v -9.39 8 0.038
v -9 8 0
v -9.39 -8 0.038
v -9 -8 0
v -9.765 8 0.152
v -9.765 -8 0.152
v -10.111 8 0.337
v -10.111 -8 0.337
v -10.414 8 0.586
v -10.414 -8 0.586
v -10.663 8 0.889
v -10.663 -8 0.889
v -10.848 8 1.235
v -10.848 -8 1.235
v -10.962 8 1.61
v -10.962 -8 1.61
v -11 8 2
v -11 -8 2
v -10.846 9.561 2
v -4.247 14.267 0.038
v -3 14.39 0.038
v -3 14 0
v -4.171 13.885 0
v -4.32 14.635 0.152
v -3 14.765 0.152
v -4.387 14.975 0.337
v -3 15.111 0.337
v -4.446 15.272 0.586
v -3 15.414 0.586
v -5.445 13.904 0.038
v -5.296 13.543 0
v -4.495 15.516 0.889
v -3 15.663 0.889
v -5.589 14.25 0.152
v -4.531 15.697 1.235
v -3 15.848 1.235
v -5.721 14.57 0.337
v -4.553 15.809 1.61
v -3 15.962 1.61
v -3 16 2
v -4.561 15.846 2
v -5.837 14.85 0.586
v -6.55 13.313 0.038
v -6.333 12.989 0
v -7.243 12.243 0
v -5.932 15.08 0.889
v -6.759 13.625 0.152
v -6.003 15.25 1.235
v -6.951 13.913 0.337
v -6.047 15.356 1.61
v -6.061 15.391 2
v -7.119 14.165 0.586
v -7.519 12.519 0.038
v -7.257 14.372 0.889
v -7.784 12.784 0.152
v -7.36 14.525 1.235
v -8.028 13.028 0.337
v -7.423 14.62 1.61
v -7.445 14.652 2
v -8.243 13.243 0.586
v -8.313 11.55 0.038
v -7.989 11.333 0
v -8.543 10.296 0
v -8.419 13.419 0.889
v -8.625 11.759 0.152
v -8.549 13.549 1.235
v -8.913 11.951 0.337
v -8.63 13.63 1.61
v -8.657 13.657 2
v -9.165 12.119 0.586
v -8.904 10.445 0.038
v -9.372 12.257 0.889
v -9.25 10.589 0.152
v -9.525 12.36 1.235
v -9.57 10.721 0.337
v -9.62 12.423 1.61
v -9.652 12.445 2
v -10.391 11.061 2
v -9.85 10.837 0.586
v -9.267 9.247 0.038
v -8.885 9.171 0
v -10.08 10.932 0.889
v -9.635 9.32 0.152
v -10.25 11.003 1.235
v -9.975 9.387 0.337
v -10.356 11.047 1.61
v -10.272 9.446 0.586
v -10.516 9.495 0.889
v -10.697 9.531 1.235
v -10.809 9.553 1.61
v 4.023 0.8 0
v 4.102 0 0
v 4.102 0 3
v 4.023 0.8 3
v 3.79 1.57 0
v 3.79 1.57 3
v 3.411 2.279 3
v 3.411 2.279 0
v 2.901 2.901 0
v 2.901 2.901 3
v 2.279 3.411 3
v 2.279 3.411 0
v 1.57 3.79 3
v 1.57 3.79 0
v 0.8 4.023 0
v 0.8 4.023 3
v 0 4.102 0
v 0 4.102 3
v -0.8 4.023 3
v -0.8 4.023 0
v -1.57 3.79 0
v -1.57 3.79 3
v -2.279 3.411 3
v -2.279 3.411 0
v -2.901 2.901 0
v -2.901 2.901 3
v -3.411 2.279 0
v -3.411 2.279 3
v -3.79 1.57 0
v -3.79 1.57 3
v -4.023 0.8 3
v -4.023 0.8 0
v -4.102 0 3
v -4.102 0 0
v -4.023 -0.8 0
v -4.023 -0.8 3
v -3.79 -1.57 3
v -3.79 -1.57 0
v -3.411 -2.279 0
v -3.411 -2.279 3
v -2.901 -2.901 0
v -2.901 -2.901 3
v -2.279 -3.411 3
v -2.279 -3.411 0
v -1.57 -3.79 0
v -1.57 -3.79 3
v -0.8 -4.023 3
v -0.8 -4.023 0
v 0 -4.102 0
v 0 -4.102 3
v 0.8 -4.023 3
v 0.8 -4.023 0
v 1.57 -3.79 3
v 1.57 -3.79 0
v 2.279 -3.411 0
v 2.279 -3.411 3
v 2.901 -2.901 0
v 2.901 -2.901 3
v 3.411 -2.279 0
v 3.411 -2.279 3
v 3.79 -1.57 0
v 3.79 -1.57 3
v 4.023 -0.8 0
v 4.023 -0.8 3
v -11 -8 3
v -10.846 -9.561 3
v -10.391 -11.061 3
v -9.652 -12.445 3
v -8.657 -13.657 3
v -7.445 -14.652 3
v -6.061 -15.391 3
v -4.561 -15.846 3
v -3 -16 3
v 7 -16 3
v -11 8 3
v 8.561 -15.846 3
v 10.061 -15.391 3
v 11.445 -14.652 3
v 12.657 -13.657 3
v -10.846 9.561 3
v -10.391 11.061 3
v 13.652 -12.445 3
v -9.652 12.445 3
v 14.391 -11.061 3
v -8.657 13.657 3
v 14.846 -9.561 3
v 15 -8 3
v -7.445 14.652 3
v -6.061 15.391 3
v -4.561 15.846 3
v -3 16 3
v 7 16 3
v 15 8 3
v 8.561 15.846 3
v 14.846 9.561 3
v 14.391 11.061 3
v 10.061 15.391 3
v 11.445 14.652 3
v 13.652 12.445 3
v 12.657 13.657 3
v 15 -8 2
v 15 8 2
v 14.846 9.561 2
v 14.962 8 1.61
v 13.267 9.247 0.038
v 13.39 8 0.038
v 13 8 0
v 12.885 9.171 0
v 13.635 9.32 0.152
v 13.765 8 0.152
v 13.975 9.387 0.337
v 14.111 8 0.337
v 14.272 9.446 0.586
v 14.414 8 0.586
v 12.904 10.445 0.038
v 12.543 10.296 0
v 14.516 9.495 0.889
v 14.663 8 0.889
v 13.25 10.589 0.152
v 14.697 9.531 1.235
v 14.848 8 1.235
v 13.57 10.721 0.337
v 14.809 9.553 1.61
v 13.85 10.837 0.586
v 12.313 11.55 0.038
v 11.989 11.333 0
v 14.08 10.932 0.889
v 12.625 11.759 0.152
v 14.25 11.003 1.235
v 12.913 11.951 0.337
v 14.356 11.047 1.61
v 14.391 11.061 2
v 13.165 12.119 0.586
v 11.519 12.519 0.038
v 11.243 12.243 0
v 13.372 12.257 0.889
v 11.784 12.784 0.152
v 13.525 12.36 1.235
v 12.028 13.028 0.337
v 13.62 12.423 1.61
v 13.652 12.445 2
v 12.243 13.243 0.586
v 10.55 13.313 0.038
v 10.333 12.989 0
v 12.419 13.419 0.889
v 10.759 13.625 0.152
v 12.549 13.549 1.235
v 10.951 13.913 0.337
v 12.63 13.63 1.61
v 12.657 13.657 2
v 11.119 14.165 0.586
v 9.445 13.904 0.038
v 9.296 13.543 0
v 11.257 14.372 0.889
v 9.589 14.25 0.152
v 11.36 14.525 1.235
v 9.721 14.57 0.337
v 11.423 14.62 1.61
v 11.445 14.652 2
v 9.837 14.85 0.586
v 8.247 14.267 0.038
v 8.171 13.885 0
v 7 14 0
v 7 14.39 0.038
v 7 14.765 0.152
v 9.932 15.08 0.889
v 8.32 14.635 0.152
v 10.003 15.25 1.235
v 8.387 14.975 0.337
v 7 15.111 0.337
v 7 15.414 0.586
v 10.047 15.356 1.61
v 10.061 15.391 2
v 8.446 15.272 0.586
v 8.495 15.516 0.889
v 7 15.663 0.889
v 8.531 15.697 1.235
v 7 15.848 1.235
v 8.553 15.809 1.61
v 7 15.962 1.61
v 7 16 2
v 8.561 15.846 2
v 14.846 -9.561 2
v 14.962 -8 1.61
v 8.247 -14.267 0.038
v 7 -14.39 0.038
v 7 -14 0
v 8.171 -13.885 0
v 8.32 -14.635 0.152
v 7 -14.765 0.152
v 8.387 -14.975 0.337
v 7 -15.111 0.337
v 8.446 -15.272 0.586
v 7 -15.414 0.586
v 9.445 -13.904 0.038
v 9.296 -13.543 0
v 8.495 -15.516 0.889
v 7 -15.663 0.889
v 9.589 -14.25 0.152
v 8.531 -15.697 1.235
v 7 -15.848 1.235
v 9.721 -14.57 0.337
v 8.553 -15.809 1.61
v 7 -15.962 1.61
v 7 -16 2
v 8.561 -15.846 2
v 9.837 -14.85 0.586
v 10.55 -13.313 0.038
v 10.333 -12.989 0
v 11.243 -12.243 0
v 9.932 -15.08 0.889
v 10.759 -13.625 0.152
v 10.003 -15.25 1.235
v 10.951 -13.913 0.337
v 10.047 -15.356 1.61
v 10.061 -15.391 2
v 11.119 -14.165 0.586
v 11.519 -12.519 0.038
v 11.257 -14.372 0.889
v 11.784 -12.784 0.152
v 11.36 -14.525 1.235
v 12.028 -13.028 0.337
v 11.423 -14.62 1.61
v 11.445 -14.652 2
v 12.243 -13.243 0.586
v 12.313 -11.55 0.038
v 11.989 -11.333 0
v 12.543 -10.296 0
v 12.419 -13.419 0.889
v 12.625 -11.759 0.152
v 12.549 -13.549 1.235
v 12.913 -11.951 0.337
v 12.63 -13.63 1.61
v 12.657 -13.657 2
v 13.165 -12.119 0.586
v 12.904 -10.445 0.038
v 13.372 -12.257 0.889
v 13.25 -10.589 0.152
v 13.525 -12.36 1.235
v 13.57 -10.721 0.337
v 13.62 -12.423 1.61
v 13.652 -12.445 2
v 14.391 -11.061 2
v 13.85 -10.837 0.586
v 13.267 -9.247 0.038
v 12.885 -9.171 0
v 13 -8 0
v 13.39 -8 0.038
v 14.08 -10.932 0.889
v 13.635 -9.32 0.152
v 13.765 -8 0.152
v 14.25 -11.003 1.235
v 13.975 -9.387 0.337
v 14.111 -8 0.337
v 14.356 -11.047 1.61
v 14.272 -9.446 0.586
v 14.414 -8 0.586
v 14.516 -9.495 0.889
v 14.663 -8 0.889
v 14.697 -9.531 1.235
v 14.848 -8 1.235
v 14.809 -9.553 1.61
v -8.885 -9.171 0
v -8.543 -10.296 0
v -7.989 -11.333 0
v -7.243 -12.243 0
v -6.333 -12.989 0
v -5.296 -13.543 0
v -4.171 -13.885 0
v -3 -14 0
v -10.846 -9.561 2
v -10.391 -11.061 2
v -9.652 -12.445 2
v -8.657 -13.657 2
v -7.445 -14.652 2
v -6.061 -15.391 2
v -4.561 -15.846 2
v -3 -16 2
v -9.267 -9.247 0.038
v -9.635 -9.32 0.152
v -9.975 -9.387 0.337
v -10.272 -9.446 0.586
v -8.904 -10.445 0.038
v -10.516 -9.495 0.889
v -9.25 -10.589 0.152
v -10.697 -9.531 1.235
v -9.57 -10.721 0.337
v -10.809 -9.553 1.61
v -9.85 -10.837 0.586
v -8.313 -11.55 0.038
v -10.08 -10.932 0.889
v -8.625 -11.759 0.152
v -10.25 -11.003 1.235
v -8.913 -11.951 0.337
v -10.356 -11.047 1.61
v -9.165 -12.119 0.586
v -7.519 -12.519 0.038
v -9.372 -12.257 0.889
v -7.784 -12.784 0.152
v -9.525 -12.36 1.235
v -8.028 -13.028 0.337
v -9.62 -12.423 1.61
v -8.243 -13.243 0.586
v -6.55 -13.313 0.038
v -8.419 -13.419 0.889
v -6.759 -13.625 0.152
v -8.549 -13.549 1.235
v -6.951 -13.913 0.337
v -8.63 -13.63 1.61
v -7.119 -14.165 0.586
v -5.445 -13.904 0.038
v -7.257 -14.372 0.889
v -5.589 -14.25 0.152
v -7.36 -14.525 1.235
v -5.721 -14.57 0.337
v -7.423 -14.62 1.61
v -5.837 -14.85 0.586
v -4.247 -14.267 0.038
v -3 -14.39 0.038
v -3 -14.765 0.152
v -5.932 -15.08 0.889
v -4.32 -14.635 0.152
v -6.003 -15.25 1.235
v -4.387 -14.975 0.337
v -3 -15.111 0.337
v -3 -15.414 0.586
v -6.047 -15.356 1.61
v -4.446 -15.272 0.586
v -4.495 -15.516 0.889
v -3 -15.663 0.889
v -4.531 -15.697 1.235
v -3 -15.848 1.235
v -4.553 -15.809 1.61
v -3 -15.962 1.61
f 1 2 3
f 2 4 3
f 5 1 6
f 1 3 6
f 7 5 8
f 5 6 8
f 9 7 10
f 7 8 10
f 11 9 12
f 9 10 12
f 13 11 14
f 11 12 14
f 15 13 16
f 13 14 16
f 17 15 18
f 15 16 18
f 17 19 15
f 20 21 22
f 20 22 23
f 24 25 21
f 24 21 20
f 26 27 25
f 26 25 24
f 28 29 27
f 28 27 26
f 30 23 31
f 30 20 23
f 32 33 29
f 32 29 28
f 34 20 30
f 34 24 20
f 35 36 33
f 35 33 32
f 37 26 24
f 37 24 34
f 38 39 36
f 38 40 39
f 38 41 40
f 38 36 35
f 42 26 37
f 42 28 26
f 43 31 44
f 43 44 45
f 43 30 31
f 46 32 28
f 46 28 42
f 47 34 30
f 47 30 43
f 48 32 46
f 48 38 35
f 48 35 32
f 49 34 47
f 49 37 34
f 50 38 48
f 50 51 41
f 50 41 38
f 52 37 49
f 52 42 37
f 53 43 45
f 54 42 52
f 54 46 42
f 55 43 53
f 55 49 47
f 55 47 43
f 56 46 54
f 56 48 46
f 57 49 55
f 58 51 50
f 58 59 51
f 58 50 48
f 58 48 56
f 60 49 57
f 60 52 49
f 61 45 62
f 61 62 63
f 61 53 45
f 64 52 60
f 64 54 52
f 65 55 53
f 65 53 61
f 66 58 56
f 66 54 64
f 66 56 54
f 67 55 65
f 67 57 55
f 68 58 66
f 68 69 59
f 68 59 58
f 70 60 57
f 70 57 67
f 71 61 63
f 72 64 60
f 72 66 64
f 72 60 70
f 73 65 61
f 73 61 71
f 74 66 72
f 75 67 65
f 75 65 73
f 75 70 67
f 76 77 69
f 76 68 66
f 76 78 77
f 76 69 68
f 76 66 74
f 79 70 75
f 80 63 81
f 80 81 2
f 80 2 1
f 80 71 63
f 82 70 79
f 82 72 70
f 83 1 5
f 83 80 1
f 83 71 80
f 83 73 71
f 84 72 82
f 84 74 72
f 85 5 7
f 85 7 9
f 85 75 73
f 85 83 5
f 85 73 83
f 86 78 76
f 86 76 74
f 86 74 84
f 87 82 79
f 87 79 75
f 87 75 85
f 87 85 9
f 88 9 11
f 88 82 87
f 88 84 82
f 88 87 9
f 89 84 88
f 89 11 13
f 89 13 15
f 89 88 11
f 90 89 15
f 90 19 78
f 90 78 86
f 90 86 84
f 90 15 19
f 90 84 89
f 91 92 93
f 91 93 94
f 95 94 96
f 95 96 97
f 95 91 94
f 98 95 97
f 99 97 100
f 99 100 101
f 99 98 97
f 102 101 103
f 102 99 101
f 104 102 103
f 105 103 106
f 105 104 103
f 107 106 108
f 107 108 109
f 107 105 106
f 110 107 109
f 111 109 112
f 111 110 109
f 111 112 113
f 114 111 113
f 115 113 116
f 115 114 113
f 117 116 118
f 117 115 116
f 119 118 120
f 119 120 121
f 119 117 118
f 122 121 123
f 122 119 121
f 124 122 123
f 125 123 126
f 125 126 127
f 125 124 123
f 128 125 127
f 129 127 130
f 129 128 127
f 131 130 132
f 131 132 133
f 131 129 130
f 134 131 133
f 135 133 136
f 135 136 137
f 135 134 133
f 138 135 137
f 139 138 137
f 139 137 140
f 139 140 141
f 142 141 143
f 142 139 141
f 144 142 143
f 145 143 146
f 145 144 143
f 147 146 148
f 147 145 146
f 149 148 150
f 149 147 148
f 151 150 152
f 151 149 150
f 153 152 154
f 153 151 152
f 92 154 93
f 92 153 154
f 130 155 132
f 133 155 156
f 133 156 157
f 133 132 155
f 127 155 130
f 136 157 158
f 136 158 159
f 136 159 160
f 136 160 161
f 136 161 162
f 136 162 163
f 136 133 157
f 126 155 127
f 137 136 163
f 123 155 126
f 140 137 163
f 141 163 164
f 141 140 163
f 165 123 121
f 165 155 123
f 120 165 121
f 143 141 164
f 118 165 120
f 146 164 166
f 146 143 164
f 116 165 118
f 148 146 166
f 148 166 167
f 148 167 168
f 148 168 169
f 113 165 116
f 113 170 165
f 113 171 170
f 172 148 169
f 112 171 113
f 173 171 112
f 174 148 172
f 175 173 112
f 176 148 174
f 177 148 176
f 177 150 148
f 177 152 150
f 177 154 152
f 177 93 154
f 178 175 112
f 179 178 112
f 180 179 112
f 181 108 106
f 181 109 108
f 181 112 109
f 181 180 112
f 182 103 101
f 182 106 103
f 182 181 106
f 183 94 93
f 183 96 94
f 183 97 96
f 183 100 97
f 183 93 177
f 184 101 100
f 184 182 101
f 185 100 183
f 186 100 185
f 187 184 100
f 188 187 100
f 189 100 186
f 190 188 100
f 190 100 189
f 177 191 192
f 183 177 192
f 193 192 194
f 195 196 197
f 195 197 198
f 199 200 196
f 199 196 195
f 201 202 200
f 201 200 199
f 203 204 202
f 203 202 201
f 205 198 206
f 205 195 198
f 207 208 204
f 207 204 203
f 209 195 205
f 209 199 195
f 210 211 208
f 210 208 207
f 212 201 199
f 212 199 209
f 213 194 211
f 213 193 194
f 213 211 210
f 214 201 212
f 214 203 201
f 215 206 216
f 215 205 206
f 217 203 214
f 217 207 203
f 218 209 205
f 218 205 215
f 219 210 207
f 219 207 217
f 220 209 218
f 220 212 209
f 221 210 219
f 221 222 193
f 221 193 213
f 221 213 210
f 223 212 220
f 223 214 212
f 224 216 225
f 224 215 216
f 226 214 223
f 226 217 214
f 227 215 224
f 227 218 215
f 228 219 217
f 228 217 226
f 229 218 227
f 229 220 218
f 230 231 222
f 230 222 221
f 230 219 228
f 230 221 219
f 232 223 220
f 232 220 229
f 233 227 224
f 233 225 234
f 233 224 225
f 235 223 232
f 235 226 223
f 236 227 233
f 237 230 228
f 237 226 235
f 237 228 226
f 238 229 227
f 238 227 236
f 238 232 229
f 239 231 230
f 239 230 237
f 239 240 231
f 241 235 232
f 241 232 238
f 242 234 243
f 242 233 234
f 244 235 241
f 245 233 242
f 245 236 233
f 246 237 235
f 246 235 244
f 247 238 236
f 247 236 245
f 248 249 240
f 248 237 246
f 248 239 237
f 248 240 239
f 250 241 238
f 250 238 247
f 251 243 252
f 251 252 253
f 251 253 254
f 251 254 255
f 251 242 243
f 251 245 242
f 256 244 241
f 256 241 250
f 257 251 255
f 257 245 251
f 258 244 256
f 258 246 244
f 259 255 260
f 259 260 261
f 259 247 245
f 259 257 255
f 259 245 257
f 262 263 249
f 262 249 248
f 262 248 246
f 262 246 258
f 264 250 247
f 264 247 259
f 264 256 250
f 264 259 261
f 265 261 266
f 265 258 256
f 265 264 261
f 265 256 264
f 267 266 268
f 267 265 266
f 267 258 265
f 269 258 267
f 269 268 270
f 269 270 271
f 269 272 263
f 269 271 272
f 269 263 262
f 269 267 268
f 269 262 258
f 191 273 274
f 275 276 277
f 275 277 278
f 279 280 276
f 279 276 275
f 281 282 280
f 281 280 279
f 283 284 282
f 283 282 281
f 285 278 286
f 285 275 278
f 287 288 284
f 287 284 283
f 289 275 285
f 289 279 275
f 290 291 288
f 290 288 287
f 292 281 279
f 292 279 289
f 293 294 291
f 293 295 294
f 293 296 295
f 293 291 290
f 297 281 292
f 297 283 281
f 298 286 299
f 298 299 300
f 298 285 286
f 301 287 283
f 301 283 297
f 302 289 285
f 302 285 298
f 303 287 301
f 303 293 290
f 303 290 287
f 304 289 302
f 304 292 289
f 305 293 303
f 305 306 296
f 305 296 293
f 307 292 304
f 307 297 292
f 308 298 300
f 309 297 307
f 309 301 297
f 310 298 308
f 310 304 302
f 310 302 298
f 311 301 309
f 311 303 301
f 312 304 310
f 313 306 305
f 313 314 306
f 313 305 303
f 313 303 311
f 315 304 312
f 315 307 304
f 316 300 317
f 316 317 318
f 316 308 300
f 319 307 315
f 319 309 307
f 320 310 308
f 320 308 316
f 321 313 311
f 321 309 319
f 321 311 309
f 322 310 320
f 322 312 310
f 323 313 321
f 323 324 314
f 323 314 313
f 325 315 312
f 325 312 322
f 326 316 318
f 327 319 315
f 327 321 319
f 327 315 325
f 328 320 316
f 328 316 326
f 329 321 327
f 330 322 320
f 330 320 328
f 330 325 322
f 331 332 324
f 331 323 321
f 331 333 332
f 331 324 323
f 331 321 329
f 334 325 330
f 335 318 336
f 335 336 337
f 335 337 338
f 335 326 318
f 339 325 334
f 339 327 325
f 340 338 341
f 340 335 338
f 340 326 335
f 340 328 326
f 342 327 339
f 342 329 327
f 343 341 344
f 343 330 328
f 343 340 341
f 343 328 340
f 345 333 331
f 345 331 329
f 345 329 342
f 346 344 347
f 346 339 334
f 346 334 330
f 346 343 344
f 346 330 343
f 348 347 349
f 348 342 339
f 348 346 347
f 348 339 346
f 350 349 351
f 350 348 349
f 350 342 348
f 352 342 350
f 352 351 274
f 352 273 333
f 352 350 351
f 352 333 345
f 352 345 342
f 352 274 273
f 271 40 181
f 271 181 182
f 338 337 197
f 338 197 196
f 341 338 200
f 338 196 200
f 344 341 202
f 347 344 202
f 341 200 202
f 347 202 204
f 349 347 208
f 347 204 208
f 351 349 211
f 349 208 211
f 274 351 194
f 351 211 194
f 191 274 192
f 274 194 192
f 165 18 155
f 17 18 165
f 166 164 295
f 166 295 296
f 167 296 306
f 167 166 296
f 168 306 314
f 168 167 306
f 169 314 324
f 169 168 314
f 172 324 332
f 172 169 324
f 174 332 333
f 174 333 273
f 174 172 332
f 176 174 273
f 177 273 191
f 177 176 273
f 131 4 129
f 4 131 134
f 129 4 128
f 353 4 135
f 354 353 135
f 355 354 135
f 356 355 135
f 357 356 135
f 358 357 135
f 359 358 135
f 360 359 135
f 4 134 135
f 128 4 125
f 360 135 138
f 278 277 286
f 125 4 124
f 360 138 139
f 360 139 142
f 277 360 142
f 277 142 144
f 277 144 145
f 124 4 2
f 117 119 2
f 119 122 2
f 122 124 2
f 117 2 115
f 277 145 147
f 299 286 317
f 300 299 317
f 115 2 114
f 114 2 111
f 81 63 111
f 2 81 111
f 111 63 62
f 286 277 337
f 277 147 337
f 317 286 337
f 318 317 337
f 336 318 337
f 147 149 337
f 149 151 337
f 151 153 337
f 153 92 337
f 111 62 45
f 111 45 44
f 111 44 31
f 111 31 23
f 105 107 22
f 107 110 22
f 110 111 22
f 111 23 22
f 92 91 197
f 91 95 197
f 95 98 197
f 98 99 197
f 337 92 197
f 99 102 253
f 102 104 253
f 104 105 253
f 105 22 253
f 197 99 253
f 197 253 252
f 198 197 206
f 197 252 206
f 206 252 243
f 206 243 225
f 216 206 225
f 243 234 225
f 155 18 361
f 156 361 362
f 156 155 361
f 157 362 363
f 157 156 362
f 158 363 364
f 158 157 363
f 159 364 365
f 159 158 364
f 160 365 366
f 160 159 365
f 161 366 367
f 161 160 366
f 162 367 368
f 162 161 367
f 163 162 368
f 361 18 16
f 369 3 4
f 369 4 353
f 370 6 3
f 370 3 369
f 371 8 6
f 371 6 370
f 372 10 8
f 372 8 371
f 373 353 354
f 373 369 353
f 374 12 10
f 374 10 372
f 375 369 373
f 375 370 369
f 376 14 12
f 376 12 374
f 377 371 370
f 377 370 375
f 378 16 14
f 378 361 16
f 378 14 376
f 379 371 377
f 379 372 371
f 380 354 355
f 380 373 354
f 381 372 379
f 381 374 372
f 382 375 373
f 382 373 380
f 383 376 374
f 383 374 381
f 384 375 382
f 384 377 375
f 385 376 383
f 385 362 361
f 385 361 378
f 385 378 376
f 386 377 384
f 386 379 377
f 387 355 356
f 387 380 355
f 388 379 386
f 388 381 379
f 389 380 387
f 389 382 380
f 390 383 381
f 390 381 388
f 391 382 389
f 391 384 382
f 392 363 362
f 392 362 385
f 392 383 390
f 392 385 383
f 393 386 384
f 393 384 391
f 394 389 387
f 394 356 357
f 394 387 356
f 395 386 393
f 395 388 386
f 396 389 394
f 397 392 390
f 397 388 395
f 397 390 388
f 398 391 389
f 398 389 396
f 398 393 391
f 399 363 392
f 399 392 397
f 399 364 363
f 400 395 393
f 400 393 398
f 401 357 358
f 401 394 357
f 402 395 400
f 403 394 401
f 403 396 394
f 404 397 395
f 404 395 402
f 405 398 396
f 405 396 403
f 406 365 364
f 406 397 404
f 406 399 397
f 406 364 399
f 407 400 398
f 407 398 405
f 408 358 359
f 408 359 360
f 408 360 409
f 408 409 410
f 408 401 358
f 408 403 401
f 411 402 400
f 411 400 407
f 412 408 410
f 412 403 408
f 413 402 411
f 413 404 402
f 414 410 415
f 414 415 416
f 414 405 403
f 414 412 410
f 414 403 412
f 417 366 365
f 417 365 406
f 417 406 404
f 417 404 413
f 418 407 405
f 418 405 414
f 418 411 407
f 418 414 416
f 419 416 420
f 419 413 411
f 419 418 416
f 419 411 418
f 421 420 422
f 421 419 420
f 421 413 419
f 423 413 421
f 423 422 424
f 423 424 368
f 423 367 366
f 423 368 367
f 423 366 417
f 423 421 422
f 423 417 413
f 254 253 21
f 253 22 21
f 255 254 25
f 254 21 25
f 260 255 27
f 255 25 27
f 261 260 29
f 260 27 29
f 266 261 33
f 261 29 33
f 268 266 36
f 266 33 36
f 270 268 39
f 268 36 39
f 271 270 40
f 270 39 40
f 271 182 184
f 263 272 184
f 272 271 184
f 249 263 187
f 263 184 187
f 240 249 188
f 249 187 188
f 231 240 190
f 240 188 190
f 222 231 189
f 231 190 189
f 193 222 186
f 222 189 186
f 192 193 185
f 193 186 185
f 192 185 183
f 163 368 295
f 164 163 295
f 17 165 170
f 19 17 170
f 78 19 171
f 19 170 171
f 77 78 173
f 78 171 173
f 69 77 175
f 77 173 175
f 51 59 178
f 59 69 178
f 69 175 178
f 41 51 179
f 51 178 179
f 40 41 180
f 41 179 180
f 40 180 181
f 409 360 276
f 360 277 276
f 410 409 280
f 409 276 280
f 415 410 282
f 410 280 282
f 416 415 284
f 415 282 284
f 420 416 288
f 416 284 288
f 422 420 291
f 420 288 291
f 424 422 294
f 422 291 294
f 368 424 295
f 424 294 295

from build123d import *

# Parameters (mm, degrees)
SKETCH1_W           = 26
SKETCH1_H           = 32
SKETCH1_R           = 4.1021
BOSS_EXTRUDE1_DEPTH = 3
FILLET1_R           = 8
FILLET2_R           = 2


with BuildPart() as part:
    # Sketch1 → Boss-Extrude1 (new body)
    with BuildSketch(Plane.XY):
        with Locations((2, 0)):
            Rectangle(SKETCH1_W, SKETCH1_H)
        Circle(SKETCH1_R, mode=Mode.SUBTRACT)
    extrude(amount=BOSS_EXTRUDE1_DEPTH)

    # Fillet1
    fillet1_edges = [part.edges().sort_by_distance(p)[0] for p in [
        (15, -16, 1.5),
        (-11, -16, 1.5),
        (-11, 16, 1.5),
        (15, 16, 1.5),
    ]]
    fillet(fillet1_edges, radius=FILLET1_R)

    # Fillet2
    fillet2_edges = [part.edges().sort_by_distance(p)[0] for p in [
        (15, 0, 0),
        (2, -16, 0),
        (-11, 0, 0),
        (2, 16, 0),
        (-8.656854249, 13.656854249, 0),
        (12.656854249, 13.656854249, 0),
        (-8.656854249, -13.656854249, 0),
        (12.656854249, -13.656854249, 0),
    ]]
    fillet(fillet2_edges, radius=FILLET2_R)


solid = part.part
